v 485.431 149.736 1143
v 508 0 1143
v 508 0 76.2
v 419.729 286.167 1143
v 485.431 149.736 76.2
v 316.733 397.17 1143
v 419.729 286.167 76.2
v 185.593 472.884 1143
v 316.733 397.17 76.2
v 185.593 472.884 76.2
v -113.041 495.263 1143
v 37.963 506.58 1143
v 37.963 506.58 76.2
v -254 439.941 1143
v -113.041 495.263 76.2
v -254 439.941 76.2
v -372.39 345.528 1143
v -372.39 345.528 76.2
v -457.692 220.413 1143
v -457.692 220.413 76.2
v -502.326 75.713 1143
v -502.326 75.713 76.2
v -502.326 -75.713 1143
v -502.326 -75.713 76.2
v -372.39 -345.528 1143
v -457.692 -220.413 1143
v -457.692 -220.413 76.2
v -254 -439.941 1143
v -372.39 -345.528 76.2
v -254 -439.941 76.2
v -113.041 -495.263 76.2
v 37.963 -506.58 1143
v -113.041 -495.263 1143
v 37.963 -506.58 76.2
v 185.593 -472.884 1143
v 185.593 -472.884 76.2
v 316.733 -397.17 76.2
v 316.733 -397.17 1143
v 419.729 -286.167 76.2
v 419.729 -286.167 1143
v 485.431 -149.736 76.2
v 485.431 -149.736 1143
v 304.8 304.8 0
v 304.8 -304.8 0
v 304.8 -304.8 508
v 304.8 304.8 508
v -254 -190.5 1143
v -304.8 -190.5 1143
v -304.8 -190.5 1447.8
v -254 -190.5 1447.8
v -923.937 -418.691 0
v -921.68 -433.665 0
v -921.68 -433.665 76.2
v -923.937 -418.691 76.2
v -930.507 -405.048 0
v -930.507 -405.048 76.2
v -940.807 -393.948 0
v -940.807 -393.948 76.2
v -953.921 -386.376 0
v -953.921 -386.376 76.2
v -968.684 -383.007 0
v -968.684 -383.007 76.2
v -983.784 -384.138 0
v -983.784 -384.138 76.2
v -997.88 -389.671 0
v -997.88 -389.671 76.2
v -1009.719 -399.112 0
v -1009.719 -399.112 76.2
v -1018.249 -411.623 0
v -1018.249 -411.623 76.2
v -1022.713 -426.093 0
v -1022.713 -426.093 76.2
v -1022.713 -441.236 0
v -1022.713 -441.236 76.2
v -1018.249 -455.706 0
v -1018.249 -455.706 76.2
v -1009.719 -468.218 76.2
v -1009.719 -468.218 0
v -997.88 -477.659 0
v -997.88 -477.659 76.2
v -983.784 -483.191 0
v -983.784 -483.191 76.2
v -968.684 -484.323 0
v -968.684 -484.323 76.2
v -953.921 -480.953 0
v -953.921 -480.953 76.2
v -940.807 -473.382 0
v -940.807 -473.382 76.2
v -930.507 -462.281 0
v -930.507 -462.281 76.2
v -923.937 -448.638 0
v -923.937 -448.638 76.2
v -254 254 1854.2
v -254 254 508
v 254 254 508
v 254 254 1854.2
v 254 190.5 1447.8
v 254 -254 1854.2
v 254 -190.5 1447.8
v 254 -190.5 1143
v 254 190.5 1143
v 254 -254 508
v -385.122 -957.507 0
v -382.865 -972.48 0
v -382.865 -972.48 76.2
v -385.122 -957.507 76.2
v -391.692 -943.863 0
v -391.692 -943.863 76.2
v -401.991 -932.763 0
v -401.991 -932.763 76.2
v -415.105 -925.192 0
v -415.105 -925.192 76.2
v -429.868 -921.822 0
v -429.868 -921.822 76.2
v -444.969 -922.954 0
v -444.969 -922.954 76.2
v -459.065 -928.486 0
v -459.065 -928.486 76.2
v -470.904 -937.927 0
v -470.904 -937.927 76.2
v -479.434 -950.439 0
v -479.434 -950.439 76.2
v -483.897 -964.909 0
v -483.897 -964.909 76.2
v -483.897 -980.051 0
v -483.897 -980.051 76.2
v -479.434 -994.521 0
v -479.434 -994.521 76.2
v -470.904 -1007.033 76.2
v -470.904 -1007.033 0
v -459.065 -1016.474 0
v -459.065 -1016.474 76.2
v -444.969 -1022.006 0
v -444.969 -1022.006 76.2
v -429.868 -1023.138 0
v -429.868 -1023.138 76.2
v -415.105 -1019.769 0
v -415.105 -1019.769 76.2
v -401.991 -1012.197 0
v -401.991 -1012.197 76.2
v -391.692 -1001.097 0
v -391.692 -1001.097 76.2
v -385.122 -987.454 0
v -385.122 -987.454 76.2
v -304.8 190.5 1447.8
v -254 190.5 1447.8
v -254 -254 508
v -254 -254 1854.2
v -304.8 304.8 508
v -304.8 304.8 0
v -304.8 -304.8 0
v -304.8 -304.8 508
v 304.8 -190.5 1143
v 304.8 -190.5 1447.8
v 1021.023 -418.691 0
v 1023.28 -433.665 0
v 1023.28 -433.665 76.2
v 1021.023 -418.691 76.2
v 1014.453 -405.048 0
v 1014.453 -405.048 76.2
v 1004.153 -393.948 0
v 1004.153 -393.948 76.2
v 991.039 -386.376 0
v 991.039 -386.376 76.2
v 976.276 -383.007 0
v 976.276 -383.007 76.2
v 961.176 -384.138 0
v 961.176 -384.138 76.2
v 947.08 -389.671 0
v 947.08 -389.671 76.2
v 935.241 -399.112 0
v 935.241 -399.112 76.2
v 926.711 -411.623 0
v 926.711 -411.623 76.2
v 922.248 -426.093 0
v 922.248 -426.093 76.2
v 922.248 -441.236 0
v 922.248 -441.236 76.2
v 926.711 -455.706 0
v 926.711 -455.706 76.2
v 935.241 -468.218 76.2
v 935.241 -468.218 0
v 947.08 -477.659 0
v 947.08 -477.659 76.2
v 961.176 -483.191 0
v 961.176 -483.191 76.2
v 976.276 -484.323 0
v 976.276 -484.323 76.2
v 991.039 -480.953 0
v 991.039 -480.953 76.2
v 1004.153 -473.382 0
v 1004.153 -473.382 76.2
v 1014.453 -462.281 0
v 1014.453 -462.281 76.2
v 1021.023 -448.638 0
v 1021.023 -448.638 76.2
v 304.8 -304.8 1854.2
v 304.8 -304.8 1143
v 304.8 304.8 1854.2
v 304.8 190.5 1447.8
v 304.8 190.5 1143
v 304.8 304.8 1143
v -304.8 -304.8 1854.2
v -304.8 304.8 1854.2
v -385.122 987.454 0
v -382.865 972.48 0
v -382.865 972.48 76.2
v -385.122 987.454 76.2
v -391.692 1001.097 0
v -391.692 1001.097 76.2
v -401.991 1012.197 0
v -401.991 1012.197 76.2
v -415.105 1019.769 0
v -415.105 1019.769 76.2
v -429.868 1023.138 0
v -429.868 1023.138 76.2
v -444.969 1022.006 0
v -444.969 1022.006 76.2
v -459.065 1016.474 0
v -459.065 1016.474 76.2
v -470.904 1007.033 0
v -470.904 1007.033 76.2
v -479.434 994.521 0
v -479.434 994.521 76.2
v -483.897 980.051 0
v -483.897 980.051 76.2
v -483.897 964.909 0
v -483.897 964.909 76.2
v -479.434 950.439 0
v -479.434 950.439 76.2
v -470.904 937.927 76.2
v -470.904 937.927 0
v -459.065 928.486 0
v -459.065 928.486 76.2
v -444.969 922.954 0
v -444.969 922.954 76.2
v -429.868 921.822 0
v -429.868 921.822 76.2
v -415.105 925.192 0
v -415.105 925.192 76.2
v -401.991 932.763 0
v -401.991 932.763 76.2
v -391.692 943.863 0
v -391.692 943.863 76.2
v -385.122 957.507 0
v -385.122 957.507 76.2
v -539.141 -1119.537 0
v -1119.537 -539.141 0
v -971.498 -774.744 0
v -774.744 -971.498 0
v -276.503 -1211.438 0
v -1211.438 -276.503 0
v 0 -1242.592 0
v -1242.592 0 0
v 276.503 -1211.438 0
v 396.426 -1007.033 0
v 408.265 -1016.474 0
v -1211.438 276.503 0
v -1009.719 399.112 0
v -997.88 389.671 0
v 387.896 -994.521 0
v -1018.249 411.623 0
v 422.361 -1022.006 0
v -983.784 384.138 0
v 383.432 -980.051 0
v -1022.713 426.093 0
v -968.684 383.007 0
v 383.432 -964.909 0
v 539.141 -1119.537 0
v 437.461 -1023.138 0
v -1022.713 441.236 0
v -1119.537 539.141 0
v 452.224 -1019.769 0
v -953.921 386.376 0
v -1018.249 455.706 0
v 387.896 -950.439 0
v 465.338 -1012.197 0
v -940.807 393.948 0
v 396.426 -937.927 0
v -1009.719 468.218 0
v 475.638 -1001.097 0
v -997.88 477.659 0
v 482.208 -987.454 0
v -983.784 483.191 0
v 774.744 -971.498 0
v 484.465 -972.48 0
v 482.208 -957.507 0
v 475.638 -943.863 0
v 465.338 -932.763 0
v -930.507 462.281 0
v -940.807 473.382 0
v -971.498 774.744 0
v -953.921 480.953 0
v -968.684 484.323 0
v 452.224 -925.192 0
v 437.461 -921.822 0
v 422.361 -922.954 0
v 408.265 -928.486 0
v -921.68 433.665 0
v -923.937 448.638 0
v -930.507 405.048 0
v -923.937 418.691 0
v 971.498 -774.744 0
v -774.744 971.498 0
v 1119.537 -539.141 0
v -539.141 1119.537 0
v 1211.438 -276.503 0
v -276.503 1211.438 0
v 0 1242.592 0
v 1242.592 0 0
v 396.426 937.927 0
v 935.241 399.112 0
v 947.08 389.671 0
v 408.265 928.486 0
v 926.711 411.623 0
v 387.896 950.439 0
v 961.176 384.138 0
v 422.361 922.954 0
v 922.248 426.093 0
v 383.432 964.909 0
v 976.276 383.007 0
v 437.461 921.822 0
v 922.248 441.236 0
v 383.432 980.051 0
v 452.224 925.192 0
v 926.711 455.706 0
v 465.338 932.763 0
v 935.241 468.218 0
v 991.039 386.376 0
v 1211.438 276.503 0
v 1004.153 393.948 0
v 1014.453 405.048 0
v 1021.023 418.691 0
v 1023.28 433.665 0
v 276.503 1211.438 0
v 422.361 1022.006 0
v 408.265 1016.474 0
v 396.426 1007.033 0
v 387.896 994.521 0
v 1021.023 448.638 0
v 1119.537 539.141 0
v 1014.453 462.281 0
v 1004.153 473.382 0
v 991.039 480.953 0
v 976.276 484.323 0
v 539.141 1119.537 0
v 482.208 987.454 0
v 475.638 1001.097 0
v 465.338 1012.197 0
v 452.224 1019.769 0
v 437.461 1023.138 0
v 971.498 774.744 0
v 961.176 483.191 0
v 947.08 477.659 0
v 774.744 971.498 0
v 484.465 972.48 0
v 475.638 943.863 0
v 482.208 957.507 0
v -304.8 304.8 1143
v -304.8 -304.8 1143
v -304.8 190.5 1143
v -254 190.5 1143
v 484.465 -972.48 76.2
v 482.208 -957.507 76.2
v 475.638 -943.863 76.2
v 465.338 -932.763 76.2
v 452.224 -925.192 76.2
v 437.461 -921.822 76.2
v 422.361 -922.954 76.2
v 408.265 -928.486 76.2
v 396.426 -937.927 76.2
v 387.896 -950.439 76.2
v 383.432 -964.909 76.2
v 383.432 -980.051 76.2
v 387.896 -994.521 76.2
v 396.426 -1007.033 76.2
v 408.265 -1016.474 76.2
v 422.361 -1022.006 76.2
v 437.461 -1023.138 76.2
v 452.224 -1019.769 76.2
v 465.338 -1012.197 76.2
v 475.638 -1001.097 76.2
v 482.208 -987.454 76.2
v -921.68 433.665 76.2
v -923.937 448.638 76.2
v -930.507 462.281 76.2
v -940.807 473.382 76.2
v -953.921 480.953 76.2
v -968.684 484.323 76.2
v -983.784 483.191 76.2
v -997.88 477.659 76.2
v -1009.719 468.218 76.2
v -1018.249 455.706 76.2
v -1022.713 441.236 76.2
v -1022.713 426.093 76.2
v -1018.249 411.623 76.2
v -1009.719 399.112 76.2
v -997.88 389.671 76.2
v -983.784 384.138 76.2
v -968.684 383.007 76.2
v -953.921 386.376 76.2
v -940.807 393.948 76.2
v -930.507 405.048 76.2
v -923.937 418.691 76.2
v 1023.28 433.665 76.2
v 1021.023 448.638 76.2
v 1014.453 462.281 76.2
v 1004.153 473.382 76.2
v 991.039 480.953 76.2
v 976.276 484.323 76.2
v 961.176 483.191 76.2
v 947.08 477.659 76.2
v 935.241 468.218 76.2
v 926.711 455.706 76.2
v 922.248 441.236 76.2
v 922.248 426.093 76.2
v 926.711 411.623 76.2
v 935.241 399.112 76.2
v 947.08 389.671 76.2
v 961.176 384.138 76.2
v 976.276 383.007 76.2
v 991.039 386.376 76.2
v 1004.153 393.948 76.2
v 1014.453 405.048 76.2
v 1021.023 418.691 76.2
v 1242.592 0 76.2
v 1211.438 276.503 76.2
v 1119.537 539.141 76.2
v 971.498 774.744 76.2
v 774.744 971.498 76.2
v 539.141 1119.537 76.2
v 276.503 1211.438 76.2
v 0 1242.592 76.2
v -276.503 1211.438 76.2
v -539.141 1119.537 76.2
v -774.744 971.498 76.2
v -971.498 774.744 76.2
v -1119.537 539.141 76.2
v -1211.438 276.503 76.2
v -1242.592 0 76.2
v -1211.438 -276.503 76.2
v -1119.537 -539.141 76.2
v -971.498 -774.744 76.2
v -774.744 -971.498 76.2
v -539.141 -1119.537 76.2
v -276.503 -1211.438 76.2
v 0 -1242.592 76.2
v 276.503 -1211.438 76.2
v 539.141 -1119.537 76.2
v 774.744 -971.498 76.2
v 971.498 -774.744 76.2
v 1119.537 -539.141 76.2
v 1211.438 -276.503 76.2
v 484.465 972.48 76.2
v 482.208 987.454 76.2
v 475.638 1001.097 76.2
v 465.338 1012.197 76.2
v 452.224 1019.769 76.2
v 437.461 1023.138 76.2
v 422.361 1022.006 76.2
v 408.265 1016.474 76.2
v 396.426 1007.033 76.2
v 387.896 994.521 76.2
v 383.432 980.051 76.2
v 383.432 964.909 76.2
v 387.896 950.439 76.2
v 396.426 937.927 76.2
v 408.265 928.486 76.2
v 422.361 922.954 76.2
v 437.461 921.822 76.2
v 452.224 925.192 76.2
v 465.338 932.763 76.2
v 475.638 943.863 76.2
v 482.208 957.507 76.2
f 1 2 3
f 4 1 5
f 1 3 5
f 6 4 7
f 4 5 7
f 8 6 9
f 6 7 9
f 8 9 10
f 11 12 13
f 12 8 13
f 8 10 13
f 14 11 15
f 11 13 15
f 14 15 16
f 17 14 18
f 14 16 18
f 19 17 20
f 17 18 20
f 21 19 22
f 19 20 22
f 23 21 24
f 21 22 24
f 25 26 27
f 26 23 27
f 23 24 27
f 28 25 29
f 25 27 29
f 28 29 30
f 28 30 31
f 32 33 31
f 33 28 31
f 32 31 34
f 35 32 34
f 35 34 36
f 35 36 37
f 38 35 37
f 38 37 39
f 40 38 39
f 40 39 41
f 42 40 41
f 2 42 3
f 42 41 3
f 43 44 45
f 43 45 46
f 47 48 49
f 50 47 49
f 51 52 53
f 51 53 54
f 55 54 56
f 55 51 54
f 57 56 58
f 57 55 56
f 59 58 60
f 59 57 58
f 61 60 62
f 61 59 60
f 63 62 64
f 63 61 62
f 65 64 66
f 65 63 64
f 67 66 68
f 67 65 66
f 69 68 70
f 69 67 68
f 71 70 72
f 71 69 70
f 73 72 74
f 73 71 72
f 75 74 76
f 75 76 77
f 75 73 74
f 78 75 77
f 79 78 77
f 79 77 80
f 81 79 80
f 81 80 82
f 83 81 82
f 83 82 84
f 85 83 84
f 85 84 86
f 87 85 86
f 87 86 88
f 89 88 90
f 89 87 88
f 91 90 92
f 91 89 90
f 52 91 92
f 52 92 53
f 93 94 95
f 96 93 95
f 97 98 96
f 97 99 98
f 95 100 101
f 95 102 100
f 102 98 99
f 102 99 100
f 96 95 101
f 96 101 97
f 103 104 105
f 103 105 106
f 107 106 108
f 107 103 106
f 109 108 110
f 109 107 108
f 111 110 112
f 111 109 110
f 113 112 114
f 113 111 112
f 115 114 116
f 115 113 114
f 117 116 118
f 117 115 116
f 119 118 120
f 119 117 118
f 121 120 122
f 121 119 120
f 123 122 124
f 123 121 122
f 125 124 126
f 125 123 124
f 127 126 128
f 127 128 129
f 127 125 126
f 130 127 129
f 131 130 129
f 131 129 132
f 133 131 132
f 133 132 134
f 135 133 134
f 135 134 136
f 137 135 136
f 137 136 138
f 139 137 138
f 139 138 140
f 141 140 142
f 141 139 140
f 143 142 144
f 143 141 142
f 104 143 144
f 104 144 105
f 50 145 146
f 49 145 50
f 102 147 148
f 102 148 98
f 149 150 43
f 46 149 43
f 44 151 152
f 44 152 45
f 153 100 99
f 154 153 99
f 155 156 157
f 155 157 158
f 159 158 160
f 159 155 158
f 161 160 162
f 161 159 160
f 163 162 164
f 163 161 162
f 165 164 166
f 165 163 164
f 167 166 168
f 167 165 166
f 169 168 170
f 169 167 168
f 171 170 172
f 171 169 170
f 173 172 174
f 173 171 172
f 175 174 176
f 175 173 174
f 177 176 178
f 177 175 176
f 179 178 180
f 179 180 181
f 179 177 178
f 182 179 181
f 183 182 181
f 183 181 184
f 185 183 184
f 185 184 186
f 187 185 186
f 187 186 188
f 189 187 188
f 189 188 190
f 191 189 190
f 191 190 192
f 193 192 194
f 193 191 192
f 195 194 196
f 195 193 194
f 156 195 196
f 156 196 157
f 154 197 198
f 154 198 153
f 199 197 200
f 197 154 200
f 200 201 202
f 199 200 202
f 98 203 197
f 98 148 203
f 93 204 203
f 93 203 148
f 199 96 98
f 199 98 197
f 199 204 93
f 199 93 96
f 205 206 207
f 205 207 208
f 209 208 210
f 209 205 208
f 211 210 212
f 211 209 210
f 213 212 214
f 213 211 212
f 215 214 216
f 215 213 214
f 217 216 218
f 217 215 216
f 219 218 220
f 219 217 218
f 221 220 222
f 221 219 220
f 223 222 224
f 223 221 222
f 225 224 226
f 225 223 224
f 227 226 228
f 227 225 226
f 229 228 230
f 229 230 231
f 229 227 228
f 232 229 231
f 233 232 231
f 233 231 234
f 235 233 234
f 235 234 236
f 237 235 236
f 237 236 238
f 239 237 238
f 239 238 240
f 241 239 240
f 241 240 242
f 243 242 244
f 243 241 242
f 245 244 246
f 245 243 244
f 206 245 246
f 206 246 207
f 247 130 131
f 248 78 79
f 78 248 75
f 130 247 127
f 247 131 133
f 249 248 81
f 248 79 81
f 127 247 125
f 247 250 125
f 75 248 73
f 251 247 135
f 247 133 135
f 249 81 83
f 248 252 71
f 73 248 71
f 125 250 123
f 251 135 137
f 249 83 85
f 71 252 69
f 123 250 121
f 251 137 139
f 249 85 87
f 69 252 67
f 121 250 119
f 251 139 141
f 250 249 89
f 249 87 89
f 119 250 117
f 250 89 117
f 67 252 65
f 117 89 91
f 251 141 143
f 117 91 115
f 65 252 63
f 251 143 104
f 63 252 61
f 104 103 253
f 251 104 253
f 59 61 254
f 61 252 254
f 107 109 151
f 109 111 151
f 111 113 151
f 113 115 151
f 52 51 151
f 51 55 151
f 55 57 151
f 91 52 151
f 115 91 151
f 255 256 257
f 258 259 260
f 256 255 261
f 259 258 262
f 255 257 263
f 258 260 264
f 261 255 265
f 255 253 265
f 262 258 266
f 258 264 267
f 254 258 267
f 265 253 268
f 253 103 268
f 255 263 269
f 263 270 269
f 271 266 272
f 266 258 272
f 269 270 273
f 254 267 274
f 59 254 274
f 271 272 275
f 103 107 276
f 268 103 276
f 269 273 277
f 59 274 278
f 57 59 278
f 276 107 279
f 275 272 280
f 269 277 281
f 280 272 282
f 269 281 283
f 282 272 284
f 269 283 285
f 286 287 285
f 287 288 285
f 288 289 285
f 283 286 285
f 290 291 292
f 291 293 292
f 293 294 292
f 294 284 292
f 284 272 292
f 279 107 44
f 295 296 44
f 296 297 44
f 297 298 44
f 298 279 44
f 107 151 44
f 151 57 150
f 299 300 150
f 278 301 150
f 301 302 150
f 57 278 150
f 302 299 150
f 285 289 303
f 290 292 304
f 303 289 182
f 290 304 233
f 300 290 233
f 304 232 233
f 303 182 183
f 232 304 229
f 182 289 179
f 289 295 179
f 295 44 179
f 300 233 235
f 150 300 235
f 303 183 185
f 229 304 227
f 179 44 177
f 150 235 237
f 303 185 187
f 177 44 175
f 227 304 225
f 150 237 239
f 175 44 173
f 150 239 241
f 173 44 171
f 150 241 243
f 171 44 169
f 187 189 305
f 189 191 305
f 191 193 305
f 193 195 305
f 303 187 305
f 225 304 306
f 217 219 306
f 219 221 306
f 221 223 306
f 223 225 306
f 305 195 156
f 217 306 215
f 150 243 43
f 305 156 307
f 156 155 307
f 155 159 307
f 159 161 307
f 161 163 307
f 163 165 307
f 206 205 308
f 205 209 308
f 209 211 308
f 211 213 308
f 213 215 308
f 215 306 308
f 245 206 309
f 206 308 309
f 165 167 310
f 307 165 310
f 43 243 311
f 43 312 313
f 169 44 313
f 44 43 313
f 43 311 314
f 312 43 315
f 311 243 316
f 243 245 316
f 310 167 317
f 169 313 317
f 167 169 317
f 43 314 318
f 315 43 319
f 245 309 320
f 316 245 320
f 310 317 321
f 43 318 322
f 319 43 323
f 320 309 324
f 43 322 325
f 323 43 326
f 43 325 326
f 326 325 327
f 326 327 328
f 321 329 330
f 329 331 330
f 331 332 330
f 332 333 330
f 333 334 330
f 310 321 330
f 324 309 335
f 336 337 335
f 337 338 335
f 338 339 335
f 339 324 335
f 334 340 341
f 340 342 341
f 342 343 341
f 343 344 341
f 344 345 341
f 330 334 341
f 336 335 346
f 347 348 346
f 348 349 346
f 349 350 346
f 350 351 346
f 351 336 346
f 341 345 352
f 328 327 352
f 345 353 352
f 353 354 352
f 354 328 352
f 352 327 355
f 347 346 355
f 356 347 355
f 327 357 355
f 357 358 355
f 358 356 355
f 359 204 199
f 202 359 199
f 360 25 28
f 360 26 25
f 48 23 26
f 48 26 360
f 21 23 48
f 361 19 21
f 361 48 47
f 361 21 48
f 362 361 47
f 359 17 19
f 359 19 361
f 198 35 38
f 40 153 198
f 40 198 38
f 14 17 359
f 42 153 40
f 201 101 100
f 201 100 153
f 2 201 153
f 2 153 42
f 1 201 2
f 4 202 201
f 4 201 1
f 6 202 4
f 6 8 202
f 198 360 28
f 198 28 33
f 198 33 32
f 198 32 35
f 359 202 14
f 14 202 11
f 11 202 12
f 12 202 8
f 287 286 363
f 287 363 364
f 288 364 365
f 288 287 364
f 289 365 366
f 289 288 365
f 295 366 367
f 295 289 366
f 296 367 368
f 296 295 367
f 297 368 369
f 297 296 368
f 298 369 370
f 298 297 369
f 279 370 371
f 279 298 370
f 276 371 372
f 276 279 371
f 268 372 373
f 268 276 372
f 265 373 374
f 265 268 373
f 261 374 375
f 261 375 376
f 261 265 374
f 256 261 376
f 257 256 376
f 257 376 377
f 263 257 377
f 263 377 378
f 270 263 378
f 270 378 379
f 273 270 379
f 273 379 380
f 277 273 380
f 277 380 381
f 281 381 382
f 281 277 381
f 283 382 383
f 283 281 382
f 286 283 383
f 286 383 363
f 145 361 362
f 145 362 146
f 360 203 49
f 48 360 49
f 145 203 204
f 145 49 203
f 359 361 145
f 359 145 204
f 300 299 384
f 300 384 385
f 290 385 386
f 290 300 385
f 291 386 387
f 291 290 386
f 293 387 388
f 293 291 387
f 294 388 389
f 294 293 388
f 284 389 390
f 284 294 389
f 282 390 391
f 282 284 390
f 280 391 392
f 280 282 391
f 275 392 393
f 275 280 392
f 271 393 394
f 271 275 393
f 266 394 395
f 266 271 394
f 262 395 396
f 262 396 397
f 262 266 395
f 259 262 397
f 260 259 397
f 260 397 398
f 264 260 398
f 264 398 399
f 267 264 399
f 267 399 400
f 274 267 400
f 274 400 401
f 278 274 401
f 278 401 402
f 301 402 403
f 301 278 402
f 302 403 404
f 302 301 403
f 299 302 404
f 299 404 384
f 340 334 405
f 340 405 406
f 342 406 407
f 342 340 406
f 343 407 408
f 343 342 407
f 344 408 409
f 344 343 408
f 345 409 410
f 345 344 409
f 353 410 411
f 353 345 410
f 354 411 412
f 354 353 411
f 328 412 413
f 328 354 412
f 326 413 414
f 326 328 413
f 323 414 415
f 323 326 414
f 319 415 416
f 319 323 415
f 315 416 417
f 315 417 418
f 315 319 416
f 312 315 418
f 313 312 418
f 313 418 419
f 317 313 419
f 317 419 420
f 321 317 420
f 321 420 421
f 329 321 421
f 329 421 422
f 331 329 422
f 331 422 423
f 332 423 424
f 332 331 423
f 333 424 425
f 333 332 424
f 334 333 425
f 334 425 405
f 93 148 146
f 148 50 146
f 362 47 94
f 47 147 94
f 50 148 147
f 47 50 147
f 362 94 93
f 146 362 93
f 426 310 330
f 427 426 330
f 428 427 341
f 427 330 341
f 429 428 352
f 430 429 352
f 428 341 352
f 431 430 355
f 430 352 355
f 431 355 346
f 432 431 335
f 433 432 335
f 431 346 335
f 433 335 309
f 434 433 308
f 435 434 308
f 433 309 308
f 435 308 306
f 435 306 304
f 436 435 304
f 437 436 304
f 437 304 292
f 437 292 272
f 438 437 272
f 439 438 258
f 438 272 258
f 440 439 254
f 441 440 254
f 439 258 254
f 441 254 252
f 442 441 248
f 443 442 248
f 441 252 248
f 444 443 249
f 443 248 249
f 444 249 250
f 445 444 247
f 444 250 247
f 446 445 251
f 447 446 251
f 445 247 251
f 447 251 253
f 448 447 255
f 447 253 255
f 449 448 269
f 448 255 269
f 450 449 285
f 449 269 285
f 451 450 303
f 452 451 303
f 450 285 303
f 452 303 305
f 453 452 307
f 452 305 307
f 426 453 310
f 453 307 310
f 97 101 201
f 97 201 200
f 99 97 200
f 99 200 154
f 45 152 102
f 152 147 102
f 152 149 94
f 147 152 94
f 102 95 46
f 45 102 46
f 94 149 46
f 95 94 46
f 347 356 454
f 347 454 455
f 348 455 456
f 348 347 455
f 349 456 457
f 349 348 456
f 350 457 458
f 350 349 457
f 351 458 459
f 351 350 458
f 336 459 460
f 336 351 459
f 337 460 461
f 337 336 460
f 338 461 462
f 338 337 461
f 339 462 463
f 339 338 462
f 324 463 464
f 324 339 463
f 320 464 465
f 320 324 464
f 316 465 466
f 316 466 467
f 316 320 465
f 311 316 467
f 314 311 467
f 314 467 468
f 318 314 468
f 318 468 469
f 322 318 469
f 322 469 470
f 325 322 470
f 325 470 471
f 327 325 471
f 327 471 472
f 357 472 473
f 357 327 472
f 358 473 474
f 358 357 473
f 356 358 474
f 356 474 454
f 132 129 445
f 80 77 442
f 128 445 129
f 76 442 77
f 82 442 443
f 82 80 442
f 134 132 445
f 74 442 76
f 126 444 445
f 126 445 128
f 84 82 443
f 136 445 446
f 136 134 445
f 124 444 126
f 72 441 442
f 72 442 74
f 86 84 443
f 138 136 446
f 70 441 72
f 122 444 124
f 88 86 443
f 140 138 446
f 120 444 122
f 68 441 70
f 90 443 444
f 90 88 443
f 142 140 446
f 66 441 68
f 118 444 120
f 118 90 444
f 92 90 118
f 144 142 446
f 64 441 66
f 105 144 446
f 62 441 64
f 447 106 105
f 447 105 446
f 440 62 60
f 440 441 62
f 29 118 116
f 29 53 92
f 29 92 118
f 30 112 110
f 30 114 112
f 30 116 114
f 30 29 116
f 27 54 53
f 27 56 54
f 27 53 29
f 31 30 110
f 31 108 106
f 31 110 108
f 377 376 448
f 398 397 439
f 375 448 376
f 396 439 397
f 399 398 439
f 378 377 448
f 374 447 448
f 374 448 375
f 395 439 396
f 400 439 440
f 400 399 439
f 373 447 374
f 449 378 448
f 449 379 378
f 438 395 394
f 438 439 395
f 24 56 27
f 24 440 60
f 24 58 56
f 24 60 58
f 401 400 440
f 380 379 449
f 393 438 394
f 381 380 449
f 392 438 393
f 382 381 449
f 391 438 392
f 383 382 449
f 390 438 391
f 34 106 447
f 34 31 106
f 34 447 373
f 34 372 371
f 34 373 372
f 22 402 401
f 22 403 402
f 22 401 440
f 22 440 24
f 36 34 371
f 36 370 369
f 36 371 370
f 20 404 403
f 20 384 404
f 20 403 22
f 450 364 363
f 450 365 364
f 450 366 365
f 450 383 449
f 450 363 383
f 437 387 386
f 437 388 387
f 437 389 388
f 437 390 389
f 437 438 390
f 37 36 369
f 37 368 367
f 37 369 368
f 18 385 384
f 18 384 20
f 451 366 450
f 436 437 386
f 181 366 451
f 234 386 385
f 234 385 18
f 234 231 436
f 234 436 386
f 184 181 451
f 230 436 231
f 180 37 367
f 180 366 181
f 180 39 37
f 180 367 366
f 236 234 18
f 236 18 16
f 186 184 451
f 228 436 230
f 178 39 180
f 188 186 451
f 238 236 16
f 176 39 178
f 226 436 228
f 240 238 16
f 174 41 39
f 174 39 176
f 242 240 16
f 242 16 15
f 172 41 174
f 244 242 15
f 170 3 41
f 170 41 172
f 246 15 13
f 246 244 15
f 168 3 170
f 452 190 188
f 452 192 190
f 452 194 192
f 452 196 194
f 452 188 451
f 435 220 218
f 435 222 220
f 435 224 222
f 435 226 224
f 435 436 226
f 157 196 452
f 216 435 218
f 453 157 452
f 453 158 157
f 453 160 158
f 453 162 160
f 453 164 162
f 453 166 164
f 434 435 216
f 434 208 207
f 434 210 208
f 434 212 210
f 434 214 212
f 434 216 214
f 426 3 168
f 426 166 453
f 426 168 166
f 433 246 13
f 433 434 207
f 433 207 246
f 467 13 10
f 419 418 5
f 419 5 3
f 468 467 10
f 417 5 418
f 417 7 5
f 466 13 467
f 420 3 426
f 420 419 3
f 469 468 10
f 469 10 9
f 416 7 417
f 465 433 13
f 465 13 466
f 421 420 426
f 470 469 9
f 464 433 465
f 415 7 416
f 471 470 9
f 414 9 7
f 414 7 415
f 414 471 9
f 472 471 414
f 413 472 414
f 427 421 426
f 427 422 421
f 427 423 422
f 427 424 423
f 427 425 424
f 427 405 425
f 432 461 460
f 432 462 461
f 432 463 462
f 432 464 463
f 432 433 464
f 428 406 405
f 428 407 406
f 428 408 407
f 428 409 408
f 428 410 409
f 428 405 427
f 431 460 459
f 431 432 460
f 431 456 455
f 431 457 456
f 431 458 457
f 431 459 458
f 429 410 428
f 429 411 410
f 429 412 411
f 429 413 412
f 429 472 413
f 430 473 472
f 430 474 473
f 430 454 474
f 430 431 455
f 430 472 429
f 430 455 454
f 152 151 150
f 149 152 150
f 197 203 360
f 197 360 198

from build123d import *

# Parameters (mm, degrees)
F0_R     = 1242.592344
F0_R_2   = 50.8
F0_R_3   = 508
F1_DEPTH = 76.2
F0_W     = 660.4
F0_H     = 660.4
F0_W_2   = 609.6
F0_H_2   = 609.6
F0_W_3   = 508
F0_H_3   = 508
F2_DEPTH = 1143
F3_DEPTH = 1854.2
F4_DEPTH = 2540
F5_DEPTH = 508
F6_W     = 381
F6_H     = 304.8
F7_DEPTH = 962.66


with BuildPart() as f1:
    # F0 (on Top) → F1 (new body)
    with BuildSketch(Plane.XY):
        Circle(F0_R)
        with Locations((-433.664765, -972.480132)):
            Circle(F0_R_2, mode=Mode.SUBTRACT)
        with Locations((433.664765, -972.480132)):
            Circle(F0_R_2, mode=Mode.SUBTRACT)
        with Locations((-972.480132, -433.664765)):
            Circle(F0_R_2, mode=Mode.SUBTRACT)
        Circle(F0_R_3, mode=Mode.SUBTRACT)
        with Locations((972.480132, -433.664765)):
            Circle(F0_R_2, mode=Mode.SUBTRACT)
        with Locations((-972.480132, 433.664765)):
            Circle(F0_R_2, mode=Mode.SUBTRACT)
        with Locations((-433.664765, 972.480132)):
            Circle(F0_R_2, mode=Mode.SUBTRACT)
        with Locations((433.664765, 972.480132)):
            Circle(F0_R_2, mode=Mode.SUBTRACT)
        with Locations((972.480132, 433.664765)):
            Circle(F0_R_2, mode=Mode.SUBTRACT)
    extrude(amount=F1_DEPTH)

    # F0 (on Top) → F2 (join)
    with BuildSketch(Plane.XY):
        Circle(F0_R_3)
        Rectangle(F0_W, F0_H, mode=Mode.SUBTRACT)
        Rectangle(F0_W, F0_H)
        Rectangle(F0_W_2, F0_H_2, mode=Mode.SUBTRACT)
        Rectangle(F0_W_2, F0_H_2)
        Rectangle(F0_W_3, F0_H_3, mode=Mode.SUBTRACT)
        Rectangle(F0_W_3, F0_H_3)
    extrude(amount=F2_DEPTH)

    # F0 (on Top) → F3 (join)
    with BuildSketch(Plane.XY):
        Rectangle(F0_W_2, F0_H_2)
        Rectangle(F0_W_3, F0_H_3, mode=Mode.SUBTRACT)
    extrude(amount=F3_DEPTH)

    # F0 (on Top) → F4 (cut)
    with BuildSketch(Plane.XY):
        Rectangle(F0_W_3, F0_H_3)
    extrude(amount=F4_DEPTH, mode=Mode.SUBTRACT)

    # F0 (on Top) → F5 (cut)
    with BuildSketch(Plane.XY):
        Rectangle(F0_W_2, F0_H_2)
        Rectangle(F0_W_3, F0_H_3, mode=Mode.SUBTRACT)
    extrude(amount=F5_DEPTH, mode=Mode.SUBTRACT)

    # F6 (on face) → F7 (cut)
    with BuildSketch(Plane(origin=(-304.8, 0, 0), x_dir=(0, -1, 0), z_dir=(-1, 0, 0))):
        with Locations((0, 1295.4)):
            Rectangle(F6_W, F6_H)
    extrude(amount=-F7_DEPTH, mode=Mode.SUBTRACT)


solid = f1.part
